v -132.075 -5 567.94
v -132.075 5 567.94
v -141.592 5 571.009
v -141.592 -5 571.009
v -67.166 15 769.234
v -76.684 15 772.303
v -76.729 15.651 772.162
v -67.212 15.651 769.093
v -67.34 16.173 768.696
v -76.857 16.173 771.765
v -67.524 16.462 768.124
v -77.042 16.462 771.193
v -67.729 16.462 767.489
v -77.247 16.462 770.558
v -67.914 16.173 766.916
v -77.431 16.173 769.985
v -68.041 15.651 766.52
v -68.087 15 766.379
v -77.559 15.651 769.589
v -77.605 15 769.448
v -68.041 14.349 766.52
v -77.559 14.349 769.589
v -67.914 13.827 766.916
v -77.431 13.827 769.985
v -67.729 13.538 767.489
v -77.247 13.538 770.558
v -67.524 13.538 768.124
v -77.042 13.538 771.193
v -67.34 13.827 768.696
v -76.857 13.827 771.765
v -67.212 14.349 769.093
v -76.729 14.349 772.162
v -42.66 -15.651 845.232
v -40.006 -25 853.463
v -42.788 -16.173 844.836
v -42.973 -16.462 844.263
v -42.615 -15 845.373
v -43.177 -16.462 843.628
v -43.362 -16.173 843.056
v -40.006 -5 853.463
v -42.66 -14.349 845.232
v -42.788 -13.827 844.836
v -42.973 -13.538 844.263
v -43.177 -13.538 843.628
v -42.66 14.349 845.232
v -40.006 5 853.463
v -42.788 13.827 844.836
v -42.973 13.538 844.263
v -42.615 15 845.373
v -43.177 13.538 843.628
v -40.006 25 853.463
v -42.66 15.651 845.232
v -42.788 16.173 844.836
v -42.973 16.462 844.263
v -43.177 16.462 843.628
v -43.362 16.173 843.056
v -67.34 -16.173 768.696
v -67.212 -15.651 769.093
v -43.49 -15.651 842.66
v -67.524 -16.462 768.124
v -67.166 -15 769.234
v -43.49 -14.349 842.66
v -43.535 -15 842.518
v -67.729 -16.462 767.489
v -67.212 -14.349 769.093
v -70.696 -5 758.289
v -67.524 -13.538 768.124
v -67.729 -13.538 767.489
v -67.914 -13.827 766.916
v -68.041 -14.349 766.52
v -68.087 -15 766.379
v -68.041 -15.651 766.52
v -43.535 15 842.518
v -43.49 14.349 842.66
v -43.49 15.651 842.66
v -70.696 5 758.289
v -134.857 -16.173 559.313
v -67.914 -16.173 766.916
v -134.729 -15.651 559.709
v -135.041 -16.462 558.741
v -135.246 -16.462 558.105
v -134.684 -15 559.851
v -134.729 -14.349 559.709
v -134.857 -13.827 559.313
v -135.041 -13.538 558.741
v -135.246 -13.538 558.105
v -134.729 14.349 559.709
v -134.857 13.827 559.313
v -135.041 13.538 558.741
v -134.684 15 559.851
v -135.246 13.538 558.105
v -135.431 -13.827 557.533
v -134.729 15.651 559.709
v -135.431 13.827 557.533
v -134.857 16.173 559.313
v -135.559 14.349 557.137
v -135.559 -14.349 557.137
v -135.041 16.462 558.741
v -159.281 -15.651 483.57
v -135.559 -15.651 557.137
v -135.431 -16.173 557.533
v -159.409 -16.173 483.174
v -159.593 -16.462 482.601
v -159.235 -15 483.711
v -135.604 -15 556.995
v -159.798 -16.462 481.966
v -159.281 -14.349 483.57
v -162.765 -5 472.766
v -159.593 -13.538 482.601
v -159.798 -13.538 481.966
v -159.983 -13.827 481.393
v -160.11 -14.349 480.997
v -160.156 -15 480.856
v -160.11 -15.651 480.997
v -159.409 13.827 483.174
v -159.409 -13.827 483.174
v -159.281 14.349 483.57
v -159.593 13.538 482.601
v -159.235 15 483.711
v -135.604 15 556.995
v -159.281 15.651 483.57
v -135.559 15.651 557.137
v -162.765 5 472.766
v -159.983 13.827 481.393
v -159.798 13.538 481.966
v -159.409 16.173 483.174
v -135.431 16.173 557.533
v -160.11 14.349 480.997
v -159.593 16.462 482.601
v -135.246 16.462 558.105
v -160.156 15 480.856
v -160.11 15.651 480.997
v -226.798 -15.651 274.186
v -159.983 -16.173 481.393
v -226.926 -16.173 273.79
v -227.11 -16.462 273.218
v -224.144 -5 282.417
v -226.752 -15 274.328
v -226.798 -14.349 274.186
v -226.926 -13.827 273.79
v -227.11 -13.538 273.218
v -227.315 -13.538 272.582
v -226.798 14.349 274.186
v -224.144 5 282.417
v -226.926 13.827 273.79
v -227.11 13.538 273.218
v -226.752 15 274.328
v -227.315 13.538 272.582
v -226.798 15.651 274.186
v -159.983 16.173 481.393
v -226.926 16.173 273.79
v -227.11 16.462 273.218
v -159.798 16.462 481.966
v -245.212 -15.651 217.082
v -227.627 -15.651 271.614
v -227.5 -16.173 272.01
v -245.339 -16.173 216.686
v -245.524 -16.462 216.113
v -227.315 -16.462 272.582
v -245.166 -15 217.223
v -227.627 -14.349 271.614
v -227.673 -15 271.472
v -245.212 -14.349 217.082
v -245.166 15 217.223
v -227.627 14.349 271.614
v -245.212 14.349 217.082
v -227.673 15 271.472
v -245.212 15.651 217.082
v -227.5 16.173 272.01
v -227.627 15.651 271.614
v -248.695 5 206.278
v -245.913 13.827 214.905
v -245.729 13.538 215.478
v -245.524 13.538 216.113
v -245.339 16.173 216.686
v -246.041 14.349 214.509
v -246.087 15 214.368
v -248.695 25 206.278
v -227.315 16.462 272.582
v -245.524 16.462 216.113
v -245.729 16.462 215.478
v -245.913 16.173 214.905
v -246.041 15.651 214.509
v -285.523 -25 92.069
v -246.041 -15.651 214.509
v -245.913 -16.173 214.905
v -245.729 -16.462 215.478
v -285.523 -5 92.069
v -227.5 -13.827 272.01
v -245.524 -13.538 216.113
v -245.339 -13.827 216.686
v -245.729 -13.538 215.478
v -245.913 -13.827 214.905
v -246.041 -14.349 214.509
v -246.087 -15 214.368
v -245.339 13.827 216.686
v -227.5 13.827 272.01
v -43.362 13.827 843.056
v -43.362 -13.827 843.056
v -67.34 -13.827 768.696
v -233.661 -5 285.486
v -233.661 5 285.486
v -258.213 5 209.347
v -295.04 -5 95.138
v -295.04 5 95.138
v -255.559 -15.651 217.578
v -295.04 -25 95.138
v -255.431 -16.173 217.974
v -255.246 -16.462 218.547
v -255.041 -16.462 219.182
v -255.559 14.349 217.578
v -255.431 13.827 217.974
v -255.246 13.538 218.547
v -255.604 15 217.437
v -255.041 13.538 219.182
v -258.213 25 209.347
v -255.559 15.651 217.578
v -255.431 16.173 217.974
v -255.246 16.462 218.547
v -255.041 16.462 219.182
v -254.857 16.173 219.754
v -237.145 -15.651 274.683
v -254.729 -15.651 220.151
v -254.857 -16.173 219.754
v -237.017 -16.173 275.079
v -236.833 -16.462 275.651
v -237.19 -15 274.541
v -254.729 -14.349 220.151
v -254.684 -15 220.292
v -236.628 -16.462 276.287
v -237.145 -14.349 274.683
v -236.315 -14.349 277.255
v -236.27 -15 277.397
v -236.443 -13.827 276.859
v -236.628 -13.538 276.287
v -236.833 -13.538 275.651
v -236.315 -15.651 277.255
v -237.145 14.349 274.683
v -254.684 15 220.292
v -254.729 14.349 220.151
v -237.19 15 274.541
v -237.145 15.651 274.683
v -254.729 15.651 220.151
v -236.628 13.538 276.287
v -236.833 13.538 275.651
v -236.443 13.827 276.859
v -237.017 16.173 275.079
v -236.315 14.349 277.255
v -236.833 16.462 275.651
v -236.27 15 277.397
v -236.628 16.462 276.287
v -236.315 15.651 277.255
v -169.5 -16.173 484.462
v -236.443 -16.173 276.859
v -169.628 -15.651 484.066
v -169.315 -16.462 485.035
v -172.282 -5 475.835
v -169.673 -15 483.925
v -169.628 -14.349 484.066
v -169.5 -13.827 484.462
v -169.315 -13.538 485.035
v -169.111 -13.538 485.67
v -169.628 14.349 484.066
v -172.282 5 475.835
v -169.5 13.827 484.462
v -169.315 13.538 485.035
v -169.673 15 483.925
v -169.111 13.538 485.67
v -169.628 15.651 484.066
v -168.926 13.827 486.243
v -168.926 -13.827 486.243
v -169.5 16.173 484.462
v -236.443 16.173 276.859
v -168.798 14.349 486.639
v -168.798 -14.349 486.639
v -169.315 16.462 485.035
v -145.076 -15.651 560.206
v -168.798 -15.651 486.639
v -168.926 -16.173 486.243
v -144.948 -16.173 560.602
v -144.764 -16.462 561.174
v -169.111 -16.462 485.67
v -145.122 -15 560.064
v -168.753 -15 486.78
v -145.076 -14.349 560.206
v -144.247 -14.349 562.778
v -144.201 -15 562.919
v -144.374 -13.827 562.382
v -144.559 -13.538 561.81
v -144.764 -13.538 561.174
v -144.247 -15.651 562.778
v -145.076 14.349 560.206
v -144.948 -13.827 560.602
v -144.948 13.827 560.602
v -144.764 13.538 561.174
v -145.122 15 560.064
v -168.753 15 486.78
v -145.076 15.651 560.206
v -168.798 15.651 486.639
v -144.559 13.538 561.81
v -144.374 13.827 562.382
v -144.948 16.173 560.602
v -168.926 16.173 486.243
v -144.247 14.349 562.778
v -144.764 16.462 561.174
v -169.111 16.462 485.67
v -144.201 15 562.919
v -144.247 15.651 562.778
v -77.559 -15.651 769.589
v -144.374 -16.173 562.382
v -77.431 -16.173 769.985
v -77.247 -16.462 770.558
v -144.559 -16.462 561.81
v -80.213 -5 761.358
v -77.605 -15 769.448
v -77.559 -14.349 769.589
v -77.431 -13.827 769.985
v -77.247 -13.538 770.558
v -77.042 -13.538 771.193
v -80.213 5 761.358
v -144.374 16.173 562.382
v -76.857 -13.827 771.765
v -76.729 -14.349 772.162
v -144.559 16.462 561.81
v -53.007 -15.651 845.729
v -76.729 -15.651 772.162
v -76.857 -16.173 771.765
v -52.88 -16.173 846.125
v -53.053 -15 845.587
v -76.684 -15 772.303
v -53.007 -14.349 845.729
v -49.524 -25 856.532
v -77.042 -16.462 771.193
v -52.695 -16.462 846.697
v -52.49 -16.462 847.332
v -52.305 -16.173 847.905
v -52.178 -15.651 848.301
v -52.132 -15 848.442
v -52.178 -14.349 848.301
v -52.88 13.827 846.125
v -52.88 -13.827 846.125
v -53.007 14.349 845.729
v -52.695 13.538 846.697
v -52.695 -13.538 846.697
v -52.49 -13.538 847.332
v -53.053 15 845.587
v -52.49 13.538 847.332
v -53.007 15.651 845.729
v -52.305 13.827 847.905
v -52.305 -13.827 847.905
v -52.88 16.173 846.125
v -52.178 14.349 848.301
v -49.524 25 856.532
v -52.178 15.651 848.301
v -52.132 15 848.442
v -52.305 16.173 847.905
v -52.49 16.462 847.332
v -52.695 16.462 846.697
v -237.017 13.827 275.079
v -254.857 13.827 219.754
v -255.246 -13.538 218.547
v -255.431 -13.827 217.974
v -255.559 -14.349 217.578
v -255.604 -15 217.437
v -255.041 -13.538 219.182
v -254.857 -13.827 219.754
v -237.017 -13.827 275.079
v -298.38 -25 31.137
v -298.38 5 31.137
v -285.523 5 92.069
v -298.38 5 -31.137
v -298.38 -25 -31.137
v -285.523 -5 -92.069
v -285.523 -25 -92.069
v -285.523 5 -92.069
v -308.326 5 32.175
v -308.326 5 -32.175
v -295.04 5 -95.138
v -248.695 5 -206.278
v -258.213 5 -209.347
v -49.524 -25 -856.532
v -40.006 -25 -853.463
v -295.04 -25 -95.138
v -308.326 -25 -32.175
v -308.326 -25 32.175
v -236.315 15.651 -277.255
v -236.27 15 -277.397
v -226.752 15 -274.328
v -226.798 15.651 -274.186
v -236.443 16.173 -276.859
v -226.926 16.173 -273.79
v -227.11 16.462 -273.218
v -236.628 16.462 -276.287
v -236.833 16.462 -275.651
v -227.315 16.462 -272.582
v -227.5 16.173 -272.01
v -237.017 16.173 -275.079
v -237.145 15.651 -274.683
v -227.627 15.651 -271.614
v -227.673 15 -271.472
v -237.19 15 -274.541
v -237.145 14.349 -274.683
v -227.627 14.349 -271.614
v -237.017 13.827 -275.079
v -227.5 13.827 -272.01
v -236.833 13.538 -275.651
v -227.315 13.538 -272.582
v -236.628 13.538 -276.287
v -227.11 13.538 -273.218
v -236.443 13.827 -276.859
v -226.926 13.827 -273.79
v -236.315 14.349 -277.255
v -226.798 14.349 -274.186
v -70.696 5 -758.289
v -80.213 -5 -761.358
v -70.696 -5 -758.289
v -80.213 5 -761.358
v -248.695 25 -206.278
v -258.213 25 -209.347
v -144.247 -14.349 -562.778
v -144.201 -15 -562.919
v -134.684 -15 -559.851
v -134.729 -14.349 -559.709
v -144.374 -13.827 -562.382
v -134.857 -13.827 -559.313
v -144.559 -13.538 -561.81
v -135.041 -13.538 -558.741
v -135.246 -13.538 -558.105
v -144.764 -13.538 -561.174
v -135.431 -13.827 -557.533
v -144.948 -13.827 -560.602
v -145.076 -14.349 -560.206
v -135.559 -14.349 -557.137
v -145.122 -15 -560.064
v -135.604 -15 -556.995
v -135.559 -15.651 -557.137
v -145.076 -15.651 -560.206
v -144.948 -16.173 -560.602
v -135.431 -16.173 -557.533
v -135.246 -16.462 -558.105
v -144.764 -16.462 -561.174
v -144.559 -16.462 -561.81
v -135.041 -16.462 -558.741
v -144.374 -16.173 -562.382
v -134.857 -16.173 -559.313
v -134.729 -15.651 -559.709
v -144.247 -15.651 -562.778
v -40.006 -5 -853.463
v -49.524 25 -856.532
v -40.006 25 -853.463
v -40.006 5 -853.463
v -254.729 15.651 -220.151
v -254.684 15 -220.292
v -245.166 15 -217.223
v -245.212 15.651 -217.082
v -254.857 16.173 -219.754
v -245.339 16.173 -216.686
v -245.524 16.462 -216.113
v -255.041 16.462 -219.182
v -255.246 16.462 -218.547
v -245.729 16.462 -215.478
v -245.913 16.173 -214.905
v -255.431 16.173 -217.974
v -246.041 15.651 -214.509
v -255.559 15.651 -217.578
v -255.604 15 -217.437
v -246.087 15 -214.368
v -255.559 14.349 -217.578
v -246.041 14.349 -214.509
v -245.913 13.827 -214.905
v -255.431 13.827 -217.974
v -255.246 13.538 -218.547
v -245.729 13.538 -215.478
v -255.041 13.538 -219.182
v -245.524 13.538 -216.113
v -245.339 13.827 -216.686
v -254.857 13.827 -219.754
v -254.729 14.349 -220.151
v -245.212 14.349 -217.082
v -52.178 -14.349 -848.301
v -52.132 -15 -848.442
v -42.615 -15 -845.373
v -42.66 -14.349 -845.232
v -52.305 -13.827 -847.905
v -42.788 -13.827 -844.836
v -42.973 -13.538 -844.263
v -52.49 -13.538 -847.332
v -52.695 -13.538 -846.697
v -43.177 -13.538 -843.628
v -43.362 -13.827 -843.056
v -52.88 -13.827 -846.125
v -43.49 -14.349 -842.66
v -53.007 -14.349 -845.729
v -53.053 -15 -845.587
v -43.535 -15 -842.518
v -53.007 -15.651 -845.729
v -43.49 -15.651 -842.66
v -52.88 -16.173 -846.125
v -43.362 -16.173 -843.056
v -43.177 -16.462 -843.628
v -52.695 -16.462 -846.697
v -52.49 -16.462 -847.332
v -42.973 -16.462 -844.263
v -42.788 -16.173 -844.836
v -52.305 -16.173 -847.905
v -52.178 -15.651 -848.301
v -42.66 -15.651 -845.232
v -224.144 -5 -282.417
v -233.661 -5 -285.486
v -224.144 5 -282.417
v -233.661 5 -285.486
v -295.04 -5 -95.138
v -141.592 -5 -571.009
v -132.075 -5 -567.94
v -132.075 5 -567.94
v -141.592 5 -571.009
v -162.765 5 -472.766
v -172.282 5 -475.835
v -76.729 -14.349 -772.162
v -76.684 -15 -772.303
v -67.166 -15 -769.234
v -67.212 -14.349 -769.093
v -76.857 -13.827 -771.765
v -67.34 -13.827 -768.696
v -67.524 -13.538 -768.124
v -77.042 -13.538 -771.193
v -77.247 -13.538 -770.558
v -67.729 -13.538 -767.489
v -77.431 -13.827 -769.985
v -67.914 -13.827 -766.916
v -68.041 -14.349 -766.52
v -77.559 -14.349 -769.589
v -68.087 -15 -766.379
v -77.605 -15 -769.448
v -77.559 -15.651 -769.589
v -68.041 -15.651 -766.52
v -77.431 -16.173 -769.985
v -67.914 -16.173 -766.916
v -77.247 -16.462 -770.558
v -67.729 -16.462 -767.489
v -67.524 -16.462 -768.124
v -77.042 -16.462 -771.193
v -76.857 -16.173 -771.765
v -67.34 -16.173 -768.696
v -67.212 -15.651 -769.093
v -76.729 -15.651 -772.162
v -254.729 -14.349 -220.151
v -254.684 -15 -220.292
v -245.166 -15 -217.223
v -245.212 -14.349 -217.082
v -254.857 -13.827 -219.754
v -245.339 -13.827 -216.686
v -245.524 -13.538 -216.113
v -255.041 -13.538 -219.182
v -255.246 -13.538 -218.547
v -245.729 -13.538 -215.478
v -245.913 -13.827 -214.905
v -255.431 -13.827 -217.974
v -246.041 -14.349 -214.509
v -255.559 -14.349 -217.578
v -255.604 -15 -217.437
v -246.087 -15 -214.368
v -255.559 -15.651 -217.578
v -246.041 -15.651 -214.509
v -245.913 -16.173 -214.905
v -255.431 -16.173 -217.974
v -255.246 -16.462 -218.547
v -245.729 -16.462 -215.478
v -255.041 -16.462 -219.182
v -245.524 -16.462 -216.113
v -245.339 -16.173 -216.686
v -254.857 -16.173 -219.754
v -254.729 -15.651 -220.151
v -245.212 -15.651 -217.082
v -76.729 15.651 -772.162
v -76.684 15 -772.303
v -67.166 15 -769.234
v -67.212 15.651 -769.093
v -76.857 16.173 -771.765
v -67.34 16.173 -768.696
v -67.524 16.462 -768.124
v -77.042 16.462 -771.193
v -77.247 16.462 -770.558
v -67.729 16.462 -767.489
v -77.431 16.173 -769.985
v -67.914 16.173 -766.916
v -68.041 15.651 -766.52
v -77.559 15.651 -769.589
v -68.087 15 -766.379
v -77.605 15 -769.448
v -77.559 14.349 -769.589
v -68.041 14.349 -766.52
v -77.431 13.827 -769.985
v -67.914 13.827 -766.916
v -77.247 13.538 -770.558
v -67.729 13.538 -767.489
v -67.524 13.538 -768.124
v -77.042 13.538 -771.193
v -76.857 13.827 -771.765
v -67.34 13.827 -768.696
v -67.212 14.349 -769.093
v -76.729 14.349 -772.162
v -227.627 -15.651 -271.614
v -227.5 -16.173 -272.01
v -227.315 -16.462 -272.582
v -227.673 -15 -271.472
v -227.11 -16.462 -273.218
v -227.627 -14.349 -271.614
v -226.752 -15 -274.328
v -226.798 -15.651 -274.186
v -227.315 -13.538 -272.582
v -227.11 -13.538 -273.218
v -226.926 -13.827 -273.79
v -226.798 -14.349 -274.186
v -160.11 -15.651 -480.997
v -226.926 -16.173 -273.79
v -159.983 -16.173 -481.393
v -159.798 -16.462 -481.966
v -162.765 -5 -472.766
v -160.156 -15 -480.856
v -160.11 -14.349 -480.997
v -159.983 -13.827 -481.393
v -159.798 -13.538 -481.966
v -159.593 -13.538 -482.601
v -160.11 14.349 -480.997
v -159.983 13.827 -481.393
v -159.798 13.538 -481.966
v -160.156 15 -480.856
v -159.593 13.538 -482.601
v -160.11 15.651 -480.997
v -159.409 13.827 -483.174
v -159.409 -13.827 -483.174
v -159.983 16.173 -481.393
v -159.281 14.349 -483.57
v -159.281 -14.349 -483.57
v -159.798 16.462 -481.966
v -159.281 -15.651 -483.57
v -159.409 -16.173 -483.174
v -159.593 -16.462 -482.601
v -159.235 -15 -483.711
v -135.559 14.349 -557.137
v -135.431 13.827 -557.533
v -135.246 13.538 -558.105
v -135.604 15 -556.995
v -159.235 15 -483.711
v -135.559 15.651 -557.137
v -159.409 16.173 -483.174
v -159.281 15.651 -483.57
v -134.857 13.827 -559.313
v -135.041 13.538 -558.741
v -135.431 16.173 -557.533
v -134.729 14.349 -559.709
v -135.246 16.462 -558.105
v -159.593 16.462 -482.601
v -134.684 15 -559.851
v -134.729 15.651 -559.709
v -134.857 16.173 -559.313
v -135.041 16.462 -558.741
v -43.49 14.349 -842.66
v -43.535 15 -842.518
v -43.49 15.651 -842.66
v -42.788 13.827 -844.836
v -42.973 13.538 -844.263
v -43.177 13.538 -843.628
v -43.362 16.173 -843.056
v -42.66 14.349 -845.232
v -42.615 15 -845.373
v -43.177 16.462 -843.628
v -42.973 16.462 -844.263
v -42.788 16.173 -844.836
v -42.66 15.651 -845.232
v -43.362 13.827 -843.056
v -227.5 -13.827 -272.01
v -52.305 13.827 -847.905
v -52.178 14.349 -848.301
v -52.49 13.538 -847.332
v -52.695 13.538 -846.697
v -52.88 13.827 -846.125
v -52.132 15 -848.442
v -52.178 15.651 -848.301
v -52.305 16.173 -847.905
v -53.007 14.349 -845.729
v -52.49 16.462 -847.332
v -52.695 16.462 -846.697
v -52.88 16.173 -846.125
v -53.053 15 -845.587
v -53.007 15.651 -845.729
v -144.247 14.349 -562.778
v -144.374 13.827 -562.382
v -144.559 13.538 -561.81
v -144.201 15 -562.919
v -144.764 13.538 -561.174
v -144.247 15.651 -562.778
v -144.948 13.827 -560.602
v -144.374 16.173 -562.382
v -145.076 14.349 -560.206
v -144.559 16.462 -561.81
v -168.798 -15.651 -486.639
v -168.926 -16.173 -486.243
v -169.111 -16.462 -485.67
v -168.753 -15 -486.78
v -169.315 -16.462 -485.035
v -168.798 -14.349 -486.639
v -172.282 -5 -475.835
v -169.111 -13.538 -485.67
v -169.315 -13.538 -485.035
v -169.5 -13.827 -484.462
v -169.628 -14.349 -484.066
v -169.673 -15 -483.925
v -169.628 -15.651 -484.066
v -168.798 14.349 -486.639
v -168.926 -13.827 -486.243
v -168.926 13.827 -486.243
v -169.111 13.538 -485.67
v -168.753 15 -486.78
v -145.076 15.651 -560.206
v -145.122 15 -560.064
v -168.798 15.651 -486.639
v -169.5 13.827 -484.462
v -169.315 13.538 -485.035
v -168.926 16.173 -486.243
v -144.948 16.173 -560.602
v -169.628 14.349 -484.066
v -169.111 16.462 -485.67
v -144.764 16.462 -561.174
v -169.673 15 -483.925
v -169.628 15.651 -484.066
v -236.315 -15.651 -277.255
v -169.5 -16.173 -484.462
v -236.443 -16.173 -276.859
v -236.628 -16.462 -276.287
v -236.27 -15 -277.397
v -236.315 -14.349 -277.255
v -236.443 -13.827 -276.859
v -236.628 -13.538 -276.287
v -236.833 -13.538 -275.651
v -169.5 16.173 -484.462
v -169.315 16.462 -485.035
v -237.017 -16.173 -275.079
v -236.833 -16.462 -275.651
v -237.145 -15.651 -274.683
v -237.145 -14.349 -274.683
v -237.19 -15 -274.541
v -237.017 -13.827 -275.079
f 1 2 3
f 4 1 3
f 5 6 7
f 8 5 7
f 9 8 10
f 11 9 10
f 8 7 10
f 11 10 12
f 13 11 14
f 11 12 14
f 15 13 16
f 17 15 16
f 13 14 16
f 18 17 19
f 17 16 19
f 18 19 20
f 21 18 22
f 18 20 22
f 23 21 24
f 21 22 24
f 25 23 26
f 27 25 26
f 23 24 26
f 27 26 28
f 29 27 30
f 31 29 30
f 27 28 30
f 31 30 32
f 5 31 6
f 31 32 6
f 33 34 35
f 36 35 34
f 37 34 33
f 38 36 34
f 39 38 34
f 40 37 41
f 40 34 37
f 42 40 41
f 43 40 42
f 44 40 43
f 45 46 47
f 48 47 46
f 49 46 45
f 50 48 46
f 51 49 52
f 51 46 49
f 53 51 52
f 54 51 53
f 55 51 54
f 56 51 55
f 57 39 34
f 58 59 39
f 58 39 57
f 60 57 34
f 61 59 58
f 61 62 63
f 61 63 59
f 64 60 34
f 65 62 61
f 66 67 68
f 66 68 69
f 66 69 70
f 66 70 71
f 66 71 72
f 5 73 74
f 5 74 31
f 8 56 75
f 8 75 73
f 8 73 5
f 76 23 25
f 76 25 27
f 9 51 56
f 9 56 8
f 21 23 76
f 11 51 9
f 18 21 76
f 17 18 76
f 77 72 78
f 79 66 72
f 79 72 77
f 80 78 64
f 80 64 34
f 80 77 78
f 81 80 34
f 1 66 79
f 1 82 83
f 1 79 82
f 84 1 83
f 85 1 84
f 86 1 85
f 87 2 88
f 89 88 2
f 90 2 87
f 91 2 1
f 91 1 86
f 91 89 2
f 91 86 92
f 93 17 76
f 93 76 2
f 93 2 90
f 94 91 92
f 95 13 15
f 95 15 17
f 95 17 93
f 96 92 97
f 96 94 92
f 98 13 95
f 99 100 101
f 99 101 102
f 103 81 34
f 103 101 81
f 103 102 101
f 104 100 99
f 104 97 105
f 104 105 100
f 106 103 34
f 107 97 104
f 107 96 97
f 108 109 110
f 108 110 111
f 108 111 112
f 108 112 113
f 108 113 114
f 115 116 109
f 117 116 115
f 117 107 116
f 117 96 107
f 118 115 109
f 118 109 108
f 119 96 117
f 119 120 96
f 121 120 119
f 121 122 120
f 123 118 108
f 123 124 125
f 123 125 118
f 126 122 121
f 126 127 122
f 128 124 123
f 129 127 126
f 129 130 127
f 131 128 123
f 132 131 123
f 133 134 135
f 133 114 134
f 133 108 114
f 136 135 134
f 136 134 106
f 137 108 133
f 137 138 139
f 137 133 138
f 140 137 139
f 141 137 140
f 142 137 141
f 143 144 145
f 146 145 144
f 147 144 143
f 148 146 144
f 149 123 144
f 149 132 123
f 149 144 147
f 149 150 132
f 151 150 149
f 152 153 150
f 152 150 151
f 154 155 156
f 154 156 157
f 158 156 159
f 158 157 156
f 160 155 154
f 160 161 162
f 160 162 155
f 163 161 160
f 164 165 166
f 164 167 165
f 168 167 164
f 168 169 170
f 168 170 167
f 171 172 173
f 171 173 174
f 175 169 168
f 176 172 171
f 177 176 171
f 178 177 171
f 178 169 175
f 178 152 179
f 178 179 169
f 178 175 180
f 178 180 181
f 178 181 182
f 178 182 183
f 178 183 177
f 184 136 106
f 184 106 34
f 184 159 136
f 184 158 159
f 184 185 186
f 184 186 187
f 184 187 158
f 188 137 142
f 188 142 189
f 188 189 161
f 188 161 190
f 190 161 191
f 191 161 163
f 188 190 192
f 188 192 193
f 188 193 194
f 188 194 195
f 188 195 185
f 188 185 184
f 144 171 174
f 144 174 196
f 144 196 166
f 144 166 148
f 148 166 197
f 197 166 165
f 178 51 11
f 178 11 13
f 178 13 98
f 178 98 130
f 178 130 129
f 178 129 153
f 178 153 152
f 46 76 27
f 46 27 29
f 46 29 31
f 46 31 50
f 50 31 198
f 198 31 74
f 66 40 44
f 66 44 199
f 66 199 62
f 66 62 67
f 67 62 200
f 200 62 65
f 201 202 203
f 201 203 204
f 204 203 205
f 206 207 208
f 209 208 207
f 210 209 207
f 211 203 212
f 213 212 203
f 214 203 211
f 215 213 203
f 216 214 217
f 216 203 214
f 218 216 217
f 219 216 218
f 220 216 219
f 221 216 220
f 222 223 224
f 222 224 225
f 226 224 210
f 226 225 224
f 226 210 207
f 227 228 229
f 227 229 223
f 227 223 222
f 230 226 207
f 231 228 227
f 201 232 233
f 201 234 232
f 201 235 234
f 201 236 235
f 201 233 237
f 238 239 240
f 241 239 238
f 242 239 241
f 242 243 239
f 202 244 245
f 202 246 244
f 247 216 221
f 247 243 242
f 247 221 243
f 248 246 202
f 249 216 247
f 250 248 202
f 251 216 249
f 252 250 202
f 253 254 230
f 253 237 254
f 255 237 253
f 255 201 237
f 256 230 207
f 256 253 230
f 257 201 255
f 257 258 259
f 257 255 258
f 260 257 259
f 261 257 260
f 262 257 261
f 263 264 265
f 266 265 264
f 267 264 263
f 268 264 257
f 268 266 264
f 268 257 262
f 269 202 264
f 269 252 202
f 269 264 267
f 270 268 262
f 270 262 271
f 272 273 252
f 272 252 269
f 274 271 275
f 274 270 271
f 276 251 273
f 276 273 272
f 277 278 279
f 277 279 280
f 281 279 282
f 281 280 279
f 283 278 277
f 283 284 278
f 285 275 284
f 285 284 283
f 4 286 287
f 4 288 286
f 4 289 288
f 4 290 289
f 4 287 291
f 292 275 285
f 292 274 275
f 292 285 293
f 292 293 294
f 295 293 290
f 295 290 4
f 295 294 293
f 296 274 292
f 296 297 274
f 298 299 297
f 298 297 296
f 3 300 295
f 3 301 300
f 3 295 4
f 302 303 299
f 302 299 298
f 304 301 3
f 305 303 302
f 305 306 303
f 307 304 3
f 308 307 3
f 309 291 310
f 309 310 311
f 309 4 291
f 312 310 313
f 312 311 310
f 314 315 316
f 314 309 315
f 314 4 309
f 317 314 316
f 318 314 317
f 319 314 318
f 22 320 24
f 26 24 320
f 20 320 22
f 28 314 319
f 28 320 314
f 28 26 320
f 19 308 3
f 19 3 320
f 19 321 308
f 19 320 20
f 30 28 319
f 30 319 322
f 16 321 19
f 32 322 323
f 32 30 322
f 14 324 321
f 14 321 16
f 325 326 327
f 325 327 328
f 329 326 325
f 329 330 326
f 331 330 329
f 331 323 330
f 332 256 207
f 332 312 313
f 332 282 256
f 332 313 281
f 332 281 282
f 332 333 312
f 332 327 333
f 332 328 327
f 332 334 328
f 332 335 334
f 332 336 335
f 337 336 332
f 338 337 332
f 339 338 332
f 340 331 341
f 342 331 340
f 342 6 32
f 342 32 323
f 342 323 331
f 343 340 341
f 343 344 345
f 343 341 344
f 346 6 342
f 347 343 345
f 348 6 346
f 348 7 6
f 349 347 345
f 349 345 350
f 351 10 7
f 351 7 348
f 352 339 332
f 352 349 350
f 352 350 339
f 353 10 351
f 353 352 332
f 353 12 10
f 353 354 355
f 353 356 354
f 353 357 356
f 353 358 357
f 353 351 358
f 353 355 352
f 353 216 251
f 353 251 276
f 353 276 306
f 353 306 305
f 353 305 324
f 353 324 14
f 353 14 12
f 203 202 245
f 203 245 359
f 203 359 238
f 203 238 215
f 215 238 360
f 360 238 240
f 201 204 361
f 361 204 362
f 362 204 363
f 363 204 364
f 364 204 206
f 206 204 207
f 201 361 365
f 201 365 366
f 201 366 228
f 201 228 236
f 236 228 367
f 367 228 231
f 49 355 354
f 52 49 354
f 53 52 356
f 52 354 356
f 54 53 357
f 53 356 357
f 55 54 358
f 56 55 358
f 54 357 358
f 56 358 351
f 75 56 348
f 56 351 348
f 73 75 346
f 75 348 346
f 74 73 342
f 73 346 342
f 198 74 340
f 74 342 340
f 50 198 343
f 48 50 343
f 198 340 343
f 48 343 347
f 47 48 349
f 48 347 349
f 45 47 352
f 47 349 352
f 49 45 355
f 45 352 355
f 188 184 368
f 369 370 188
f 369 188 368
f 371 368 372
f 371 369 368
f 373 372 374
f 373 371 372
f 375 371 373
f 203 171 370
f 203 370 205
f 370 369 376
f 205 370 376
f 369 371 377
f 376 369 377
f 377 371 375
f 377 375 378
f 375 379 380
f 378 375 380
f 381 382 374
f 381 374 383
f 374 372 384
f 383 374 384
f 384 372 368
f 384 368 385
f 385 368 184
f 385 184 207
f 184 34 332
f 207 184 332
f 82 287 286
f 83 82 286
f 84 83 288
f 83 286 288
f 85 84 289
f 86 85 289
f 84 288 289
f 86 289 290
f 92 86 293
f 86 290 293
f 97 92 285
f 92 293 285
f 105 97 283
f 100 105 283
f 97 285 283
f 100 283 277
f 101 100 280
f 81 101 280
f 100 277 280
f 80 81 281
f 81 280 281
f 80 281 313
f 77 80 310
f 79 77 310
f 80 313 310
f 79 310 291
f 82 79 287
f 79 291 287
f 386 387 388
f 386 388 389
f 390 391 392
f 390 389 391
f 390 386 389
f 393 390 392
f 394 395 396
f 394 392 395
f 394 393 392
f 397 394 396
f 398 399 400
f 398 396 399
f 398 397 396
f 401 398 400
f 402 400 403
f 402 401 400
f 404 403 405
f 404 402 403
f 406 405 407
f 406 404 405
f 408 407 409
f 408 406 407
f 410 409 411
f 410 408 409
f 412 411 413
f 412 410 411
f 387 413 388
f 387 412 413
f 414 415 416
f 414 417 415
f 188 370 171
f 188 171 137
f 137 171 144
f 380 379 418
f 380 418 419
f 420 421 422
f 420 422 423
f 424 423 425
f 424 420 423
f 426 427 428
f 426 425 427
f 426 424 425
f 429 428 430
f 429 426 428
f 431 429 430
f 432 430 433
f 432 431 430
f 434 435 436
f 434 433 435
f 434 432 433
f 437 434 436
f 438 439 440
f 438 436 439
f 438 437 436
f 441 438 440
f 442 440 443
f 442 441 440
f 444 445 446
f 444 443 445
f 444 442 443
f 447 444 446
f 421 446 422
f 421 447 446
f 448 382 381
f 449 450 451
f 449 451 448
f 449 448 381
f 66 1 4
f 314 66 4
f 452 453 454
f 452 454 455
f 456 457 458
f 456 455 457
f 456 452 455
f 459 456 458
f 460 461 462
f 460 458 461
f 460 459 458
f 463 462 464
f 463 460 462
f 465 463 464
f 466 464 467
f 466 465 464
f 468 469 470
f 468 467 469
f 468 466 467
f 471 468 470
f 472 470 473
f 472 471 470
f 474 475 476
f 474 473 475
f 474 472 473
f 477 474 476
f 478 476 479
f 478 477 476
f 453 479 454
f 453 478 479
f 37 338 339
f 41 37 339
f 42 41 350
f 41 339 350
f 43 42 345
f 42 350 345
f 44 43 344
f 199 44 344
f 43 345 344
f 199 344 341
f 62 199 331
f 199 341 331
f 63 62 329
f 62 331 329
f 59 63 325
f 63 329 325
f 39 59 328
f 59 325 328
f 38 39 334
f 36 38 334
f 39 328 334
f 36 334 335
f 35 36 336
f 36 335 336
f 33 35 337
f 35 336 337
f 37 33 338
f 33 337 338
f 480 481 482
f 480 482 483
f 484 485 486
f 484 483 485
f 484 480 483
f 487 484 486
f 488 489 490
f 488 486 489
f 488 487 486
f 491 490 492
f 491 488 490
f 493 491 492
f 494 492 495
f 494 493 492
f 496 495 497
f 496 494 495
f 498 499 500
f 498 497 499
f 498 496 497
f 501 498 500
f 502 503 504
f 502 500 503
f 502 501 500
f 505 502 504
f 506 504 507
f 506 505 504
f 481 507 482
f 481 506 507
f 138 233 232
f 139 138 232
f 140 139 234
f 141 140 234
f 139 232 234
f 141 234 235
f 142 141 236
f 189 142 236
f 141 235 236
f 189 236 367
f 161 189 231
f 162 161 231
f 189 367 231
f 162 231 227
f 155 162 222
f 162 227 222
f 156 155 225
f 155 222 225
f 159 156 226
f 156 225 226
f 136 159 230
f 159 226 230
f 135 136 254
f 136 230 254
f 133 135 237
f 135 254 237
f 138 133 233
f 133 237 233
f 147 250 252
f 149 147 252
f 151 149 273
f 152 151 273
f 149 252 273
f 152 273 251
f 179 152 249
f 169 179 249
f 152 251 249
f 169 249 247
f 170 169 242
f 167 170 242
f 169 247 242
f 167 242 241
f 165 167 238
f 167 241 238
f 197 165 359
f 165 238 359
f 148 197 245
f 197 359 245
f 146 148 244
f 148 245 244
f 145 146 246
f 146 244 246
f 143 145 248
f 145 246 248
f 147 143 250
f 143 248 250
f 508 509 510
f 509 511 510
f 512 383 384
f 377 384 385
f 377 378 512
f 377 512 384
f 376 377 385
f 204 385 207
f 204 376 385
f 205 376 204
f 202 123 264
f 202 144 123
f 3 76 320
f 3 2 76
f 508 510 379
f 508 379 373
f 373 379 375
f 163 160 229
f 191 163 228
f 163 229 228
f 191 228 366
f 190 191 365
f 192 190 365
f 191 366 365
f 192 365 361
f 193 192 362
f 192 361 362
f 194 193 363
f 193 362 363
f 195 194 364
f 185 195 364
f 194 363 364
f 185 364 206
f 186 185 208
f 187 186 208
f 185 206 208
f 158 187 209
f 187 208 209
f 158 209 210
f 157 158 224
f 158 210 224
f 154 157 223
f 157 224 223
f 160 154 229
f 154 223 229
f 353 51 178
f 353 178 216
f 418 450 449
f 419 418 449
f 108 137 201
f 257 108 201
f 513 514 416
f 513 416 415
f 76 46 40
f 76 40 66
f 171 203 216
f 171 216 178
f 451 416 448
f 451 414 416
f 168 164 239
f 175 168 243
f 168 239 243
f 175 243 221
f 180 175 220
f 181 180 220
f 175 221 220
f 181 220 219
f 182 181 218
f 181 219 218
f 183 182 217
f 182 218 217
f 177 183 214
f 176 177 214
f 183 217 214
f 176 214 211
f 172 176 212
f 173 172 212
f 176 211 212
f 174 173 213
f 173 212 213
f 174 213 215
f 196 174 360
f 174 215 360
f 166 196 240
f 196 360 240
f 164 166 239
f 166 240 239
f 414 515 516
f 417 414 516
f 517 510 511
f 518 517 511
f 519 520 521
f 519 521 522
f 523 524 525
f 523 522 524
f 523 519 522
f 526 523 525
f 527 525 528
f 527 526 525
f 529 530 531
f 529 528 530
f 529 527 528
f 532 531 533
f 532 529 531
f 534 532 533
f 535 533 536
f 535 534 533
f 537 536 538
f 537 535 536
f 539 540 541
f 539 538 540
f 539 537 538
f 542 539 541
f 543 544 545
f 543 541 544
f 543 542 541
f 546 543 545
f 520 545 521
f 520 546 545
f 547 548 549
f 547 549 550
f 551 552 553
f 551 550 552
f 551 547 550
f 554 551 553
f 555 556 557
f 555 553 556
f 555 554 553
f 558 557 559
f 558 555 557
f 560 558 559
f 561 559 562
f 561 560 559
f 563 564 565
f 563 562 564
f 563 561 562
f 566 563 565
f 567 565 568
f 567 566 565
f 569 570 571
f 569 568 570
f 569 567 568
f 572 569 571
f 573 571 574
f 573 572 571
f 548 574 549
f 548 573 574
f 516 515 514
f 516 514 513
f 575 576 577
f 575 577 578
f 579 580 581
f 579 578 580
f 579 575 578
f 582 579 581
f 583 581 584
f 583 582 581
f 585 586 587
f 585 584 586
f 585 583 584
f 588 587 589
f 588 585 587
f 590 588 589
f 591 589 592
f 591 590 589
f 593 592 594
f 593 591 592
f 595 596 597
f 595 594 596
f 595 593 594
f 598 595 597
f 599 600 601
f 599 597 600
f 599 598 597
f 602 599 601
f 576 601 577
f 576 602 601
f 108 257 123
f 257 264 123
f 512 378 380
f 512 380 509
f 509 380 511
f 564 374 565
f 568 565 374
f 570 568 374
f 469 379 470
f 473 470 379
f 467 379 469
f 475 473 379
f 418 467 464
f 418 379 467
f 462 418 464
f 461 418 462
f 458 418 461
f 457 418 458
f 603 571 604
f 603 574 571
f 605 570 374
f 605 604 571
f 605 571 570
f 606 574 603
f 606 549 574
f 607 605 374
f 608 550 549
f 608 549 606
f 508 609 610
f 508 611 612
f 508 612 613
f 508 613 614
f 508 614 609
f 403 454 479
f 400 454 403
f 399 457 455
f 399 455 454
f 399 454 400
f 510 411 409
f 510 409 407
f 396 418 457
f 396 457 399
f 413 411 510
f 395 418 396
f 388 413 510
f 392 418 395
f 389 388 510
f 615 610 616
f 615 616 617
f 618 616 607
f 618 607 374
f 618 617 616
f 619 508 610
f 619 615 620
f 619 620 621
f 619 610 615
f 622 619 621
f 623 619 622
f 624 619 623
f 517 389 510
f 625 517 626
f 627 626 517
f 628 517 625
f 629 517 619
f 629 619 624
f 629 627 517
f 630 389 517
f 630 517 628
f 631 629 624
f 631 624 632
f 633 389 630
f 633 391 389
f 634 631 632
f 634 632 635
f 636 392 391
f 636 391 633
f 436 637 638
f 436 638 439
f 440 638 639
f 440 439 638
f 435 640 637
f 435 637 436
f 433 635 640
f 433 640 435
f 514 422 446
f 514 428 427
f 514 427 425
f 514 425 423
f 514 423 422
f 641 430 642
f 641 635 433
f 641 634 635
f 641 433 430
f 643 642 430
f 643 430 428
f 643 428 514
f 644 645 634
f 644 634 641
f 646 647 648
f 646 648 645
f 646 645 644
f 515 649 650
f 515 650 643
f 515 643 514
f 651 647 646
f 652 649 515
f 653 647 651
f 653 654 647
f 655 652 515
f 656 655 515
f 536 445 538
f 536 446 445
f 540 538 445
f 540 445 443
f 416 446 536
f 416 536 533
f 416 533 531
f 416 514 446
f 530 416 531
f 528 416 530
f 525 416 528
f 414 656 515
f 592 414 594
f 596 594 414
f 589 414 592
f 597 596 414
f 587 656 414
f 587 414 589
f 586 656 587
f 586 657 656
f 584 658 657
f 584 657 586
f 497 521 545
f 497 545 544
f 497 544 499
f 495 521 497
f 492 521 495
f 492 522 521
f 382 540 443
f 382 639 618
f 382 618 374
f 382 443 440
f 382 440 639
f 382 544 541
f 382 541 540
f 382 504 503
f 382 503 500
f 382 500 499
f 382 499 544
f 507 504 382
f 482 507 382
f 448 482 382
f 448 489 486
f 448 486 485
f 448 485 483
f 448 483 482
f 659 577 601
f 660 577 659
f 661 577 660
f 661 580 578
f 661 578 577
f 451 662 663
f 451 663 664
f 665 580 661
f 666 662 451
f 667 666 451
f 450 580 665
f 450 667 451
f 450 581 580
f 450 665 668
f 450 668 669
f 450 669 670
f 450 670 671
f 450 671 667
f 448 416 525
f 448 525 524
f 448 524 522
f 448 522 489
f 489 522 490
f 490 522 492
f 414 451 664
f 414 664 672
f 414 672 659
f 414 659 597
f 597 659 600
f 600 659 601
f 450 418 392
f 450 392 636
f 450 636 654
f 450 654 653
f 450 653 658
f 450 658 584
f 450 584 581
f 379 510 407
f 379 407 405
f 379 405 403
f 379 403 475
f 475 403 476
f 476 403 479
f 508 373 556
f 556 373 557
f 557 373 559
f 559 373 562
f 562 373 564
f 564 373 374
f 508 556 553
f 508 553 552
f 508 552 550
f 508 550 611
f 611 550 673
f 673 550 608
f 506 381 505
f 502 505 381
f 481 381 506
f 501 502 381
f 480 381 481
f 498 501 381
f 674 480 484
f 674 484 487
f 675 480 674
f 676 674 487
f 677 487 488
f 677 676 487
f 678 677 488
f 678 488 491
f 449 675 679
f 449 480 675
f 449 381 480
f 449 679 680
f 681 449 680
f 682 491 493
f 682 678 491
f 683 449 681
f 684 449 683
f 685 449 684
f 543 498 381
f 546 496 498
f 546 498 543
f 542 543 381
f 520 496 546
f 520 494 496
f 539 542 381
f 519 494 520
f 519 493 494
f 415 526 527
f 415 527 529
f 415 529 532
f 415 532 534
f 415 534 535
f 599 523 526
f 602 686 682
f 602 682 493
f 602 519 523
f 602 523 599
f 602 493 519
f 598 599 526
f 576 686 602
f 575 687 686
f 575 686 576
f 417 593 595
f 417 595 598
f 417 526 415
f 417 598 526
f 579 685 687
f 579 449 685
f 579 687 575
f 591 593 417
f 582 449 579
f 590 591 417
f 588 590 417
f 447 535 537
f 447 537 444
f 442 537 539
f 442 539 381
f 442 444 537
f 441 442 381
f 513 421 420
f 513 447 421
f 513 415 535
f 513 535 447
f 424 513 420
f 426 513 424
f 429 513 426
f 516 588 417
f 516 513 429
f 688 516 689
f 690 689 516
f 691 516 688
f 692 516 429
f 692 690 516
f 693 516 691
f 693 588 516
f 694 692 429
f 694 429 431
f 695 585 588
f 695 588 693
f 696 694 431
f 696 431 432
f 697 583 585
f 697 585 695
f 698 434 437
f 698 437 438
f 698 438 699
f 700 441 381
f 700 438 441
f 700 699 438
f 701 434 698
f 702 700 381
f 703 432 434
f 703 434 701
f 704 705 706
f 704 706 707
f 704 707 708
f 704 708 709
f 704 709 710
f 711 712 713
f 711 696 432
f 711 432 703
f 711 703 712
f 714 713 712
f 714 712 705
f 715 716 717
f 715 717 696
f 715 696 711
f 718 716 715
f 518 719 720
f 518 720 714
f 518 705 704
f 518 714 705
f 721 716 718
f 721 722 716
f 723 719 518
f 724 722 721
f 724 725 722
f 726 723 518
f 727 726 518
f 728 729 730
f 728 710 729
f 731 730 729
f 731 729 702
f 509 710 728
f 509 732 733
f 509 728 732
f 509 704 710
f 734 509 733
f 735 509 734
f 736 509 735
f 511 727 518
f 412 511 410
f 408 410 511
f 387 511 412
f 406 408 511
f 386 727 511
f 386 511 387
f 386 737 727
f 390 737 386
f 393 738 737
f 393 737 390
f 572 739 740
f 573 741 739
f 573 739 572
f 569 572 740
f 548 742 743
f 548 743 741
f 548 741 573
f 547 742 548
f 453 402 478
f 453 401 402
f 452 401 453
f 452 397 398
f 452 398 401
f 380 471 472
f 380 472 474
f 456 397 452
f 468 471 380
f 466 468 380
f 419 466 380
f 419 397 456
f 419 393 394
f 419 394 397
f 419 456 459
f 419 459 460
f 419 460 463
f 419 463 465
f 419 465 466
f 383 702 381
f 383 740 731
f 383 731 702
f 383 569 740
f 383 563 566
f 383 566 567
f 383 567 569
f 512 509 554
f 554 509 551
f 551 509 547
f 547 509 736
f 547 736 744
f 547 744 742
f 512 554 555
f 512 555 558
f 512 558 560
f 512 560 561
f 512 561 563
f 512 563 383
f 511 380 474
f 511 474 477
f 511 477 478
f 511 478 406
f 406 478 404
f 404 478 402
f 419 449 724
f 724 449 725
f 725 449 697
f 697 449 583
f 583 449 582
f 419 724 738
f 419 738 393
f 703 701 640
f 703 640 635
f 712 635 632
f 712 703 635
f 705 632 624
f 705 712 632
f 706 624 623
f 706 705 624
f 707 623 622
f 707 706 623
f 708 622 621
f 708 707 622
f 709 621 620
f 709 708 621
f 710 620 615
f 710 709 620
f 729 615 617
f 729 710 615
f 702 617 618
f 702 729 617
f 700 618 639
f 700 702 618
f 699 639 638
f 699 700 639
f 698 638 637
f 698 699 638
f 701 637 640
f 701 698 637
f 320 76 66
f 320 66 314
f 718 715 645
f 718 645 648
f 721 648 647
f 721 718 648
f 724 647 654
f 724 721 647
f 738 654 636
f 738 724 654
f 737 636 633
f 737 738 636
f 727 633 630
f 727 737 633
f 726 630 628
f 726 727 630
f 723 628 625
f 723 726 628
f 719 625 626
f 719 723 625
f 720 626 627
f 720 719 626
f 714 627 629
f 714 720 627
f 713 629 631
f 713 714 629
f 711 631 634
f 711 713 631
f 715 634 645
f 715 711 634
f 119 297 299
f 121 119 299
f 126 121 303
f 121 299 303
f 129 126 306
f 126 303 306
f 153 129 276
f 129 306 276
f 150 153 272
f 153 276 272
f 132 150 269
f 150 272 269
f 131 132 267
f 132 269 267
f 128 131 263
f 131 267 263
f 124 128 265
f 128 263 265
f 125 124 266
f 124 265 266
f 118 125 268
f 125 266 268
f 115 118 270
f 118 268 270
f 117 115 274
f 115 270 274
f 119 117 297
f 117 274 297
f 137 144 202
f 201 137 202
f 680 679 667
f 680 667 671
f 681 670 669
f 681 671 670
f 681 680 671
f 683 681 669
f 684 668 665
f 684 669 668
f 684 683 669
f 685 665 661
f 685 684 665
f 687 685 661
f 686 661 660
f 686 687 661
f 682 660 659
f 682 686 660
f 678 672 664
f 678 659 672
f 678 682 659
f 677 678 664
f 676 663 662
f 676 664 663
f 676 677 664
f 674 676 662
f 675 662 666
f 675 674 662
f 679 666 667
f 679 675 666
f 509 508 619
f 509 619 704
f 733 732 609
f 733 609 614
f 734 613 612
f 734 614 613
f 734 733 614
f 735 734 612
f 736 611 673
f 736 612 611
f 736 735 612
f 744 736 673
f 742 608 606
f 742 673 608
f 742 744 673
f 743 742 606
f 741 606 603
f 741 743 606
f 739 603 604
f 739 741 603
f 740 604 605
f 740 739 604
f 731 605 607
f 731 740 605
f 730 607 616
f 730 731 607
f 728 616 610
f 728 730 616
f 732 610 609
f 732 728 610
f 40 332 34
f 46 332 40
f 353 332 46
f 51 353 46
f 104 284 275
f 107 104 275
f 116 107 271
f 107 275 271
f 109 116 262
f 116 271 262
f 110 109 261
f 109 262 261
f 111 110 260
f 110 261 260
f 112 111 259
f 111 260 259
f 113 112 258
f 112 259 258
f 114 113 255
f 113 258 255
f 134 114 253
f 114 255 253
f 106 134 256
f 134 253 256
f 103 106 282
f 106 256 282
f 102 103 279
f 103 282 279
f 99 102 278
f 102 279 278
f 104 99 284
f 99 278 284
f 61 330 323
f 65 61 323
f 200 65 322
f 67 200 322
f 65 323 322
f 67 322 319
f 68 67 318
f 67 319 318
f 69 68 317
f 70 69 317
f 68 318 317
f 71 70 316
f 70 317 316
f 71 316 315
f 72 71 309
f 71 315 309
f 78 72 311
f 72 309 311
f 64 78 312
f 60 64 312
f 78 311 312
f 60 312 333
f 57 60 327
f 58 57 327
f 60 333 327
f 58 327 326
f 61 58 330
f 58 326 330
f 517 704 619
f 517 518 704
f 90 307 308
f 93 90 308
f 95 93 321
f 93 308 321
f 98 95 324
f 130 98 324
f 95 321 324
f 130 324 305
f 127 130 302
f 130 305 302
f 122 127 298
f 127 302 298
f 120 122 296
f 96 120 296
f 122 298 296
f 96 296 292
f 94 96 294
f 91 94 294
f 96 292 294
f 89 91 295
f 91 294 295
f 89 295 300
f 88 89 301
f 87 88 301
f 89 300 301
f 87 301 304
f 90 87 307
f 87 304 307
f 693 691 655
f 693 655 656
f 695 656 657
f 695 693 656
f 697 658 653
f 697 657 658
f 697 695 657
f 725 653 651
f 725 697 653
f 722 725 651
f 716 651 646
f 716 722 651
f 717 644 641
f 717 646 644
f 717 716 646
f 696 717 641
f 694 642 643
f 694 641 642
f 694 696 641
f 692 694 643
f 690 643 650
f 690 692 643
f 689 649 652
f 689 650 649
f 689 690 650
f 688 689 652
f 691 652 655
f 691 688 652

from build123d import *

# Parameters (mm, degrees)
BOSS_EXTRUDE1_DEPTH   = 5
BOSS_EXTRUDE1_2_DEPTH = 5
BOSS_EXTRUDE1_3_DEPTH = 5
BOSS_EXTRUDE1_4_DEPTH = 5
BOSS_EXTRUDE1_5_DEPTH = 5
BOSS_EXTRUDE2_DEPTH   = 20
BOSS_EXTRUDE3_DEPTH   = 20
SKETCH8_R             = 1.5
CUT_EXTRUDE2_DEPTH    = 535.790809635


with BuildPart() as part:
    # Sketch3 → Boss-Extrude1 (new body, symmetric)
    with BuildSketch(Plane(origin=(0, 0, 0), x_dir=(1, 0, 0), z_dir=(0, 1, 0))):
        Polygon((-49.523523643, -856.532206403), (-40.006093165, -853.463246139), (-70.69569581, -758.288941363), (-80.213126288, -761.357901628), align=None)
    extrude(amount=BOSS_EXTRUDE1_DEPTH, both=True)



with BuildPart() as body_2:
    # Sketch3 → Boss-Extrude1 2 (new body, symmetric)
    with BuildSketch(Plane(origin=(0, 0, 0), x_dir=(1, 0, 0), z_dir=(0, 1, 0))):
        with BuildLine():
            Line((-233.661139514, -285.486377751), (-295.040344804, -95.1377682))
            ThreePointArc((-295.040344804, -95.1377682), (-310, 0), (-295.040344804, 95.1377682))
            Line((-295.040344804, 95.1377682), (-233.661139514, 285.486377751))
            Line((-233.661139514, 285.486377751), (-224.143709036, 282.417417486))
            Line((-224.143709036, 282.417417486), (-285.522914326, 92.068807935))
            ThreePointArc((-285.522914326, 92.068807935), (-300, 0), (-285.522914326, -92.068807935))
            Line((-285.522914326, -92.068807935), (-224.143709036, -282.417417486))
            Line((-224.143709036, -282.417417486), (-233.661139514, -285.486377751))
        make_face()
    extrude(amount=BOSS_EXTRUDE1_2_DEPTH, both=True)


with BuildPart() as body_3:
    # Sketch3 → Boss-Extrude1 3 (new body, symmetric)
    with BuildSketch(Plane(origin=(0, 0, 0), x_dir=(1, 0, 0), z_dir=(0, 1, 0))):
        Polygon((-132.074901101, -567.940331812), (-141.592331578, -571.009292077), (-172.281934223, -475.834987302), (-162.764503746, -472.766027037), align=None)
    extrude(amount=BOSS_EXTRUDE1_3_DEPTH, both=True)


with BuildPart() as body_4:
    # Sketch3 → Boss-Extrude1 4 (new body, symmetric)
    with BuildSketch(Plane(origin=(0, 0, 0), x_dir=(1, 0, 0), z_dir=(0, 1, 0))):
        Polygon((-70.69569581, 758.288941363), (-40.006093165, 853.463246139), (-49.523523643, 856.532206403), (-80.213126288, 761.357901628), align=None)
    extrude(amount=BOSS_EXTRUDE1_4_DEPTH, both=True)


with BuildPart() as body_5:
    # Sketch3 → Boss-Extrude1 5 (new body, symmetric)
    with BuildSketch(Plane(origin=(0, 0, 0), x_dir=(1, 0, 0), z_dir=(0, 1, 0))):
        Polygon((-162.764503746, 472.766027037), (-132.074901101, 567.940331812), (-141.592331578, 571.009292077), (-172.281934223, 475.834987302), align=None)
    extrude(amount=BOSS_EXTRUDE1_5_DEPTH, both=True)


with BuildPart() as part_1:
    add(part.part)

    add(body_2.part)  # Boss-Extrude2 merges body 2

    add(body_3.part)  # Boss-Extrude2 merges body 3

    add(body_4.part)  # Boss-Extrude2 merges body 4

    add(body_5.part)  # Boss-Extrude2 merges body 5
    # Sketch4 → Boss-Extrude2 (add)
    with BuildSketch(Plane(origin=(0, 5, 0), x_dir=(1, 0, 0), z_dir=(0, 1, 0))):
        Polygon((-49.523523643, -856.532206403), (-258.21282163, -209.34693393), (-248.695391152, -206.277973666), (-40.006093165, -853.463246139), align=None)
        Polygon((-49.523523643, 856.532206403), (-40.006093165, 853.463246139), (-248.695391152, 206.277973666), (-258.21282163, 209.34693393), align=None)
    extrude(amount=BOSS_EXTRUDE2_DEPTH)

    # Sketch5 → Boss-Extrude3 (add)
    with BuildSketch(Plane.XZ.offset(5)):
        with BuildLine():
            Line((-49.523523643, 856.532206403), (-40.006093165, 853.463246139))
            Line((-40.006093165, 853.463246139), (-285.522914326, 92.068807935))
            ThreePointArc((-285.522914326, 92.068807935), (-300, 0), (-285.522914326, -92.068807935))
            Line((-285.522914326, -92.068807935), (-40.006093165, -853.463246139))
            Line((-40.006093165, -853.463246139), (-49.523523643, -856.532206403))
            Line((-49.523523643, -856.532206403), (-295.040344804, -95.1377682))
            ThreePointArc((-295.040344804, -95.1377682), (-310, 0), (-295.040344804, 95.1377682))
            Line((-295.040344804, 95.1377682), (-49.523523643, 856.532206403))
        make_face()
    extrude(amount=BOSS_EXTRUDE3_DEPTH)

    # Sketch8 → Cut-Extrude2 (cut, through all)
    with BuildSketch(Plane(origin=(-295.040344804, 0, 95.1377682), x_dir=(0.306896026, 0, 0.951743048), z_dir=(-0.951743048, 0, 0.306896026))):
        with Locations((790, 15)):
            Circle(SKETCH8_R)
        with Locations((710, 15)):
            Circle(SKETCH8_R)
        with Locations((410, 15)):
            Circle(SKETCH8_R)
        with Locations((490, 15)):
            Circle(SKETCH8_R)
        with Locations((130, 15)):
            Circle(SKETCH8_R)
        with Locations((190, 15)):
            Circle(SKETCH8_R)
        with Locations((790, -15)):
            Circle(SKETCH8_R)
        with Locations((190, -15)):
            Circle(SKETCH8_R)
        with Locations((130, -15)):
            Circle(SKETCH8_R)
        with Locations((490, -15)):
            Circle(SKETCH8_R)
        with Locations((410, -15)):
            Circle(SKETCH8_R)
        with Locations((710, -15)):
            Circle(SKETCH8_R)
    cut_extrude2 = extrude(amount=-CUT_EXTRUDE2_DEPTH, mode=Mode.SUBTRACT)

    # Mirror1: Cut-Extrude2 across plane
    add(cut_extrude2.mirror(Plane.XY), mode=Mode.SUBTRACT)


solid = part_1.part
